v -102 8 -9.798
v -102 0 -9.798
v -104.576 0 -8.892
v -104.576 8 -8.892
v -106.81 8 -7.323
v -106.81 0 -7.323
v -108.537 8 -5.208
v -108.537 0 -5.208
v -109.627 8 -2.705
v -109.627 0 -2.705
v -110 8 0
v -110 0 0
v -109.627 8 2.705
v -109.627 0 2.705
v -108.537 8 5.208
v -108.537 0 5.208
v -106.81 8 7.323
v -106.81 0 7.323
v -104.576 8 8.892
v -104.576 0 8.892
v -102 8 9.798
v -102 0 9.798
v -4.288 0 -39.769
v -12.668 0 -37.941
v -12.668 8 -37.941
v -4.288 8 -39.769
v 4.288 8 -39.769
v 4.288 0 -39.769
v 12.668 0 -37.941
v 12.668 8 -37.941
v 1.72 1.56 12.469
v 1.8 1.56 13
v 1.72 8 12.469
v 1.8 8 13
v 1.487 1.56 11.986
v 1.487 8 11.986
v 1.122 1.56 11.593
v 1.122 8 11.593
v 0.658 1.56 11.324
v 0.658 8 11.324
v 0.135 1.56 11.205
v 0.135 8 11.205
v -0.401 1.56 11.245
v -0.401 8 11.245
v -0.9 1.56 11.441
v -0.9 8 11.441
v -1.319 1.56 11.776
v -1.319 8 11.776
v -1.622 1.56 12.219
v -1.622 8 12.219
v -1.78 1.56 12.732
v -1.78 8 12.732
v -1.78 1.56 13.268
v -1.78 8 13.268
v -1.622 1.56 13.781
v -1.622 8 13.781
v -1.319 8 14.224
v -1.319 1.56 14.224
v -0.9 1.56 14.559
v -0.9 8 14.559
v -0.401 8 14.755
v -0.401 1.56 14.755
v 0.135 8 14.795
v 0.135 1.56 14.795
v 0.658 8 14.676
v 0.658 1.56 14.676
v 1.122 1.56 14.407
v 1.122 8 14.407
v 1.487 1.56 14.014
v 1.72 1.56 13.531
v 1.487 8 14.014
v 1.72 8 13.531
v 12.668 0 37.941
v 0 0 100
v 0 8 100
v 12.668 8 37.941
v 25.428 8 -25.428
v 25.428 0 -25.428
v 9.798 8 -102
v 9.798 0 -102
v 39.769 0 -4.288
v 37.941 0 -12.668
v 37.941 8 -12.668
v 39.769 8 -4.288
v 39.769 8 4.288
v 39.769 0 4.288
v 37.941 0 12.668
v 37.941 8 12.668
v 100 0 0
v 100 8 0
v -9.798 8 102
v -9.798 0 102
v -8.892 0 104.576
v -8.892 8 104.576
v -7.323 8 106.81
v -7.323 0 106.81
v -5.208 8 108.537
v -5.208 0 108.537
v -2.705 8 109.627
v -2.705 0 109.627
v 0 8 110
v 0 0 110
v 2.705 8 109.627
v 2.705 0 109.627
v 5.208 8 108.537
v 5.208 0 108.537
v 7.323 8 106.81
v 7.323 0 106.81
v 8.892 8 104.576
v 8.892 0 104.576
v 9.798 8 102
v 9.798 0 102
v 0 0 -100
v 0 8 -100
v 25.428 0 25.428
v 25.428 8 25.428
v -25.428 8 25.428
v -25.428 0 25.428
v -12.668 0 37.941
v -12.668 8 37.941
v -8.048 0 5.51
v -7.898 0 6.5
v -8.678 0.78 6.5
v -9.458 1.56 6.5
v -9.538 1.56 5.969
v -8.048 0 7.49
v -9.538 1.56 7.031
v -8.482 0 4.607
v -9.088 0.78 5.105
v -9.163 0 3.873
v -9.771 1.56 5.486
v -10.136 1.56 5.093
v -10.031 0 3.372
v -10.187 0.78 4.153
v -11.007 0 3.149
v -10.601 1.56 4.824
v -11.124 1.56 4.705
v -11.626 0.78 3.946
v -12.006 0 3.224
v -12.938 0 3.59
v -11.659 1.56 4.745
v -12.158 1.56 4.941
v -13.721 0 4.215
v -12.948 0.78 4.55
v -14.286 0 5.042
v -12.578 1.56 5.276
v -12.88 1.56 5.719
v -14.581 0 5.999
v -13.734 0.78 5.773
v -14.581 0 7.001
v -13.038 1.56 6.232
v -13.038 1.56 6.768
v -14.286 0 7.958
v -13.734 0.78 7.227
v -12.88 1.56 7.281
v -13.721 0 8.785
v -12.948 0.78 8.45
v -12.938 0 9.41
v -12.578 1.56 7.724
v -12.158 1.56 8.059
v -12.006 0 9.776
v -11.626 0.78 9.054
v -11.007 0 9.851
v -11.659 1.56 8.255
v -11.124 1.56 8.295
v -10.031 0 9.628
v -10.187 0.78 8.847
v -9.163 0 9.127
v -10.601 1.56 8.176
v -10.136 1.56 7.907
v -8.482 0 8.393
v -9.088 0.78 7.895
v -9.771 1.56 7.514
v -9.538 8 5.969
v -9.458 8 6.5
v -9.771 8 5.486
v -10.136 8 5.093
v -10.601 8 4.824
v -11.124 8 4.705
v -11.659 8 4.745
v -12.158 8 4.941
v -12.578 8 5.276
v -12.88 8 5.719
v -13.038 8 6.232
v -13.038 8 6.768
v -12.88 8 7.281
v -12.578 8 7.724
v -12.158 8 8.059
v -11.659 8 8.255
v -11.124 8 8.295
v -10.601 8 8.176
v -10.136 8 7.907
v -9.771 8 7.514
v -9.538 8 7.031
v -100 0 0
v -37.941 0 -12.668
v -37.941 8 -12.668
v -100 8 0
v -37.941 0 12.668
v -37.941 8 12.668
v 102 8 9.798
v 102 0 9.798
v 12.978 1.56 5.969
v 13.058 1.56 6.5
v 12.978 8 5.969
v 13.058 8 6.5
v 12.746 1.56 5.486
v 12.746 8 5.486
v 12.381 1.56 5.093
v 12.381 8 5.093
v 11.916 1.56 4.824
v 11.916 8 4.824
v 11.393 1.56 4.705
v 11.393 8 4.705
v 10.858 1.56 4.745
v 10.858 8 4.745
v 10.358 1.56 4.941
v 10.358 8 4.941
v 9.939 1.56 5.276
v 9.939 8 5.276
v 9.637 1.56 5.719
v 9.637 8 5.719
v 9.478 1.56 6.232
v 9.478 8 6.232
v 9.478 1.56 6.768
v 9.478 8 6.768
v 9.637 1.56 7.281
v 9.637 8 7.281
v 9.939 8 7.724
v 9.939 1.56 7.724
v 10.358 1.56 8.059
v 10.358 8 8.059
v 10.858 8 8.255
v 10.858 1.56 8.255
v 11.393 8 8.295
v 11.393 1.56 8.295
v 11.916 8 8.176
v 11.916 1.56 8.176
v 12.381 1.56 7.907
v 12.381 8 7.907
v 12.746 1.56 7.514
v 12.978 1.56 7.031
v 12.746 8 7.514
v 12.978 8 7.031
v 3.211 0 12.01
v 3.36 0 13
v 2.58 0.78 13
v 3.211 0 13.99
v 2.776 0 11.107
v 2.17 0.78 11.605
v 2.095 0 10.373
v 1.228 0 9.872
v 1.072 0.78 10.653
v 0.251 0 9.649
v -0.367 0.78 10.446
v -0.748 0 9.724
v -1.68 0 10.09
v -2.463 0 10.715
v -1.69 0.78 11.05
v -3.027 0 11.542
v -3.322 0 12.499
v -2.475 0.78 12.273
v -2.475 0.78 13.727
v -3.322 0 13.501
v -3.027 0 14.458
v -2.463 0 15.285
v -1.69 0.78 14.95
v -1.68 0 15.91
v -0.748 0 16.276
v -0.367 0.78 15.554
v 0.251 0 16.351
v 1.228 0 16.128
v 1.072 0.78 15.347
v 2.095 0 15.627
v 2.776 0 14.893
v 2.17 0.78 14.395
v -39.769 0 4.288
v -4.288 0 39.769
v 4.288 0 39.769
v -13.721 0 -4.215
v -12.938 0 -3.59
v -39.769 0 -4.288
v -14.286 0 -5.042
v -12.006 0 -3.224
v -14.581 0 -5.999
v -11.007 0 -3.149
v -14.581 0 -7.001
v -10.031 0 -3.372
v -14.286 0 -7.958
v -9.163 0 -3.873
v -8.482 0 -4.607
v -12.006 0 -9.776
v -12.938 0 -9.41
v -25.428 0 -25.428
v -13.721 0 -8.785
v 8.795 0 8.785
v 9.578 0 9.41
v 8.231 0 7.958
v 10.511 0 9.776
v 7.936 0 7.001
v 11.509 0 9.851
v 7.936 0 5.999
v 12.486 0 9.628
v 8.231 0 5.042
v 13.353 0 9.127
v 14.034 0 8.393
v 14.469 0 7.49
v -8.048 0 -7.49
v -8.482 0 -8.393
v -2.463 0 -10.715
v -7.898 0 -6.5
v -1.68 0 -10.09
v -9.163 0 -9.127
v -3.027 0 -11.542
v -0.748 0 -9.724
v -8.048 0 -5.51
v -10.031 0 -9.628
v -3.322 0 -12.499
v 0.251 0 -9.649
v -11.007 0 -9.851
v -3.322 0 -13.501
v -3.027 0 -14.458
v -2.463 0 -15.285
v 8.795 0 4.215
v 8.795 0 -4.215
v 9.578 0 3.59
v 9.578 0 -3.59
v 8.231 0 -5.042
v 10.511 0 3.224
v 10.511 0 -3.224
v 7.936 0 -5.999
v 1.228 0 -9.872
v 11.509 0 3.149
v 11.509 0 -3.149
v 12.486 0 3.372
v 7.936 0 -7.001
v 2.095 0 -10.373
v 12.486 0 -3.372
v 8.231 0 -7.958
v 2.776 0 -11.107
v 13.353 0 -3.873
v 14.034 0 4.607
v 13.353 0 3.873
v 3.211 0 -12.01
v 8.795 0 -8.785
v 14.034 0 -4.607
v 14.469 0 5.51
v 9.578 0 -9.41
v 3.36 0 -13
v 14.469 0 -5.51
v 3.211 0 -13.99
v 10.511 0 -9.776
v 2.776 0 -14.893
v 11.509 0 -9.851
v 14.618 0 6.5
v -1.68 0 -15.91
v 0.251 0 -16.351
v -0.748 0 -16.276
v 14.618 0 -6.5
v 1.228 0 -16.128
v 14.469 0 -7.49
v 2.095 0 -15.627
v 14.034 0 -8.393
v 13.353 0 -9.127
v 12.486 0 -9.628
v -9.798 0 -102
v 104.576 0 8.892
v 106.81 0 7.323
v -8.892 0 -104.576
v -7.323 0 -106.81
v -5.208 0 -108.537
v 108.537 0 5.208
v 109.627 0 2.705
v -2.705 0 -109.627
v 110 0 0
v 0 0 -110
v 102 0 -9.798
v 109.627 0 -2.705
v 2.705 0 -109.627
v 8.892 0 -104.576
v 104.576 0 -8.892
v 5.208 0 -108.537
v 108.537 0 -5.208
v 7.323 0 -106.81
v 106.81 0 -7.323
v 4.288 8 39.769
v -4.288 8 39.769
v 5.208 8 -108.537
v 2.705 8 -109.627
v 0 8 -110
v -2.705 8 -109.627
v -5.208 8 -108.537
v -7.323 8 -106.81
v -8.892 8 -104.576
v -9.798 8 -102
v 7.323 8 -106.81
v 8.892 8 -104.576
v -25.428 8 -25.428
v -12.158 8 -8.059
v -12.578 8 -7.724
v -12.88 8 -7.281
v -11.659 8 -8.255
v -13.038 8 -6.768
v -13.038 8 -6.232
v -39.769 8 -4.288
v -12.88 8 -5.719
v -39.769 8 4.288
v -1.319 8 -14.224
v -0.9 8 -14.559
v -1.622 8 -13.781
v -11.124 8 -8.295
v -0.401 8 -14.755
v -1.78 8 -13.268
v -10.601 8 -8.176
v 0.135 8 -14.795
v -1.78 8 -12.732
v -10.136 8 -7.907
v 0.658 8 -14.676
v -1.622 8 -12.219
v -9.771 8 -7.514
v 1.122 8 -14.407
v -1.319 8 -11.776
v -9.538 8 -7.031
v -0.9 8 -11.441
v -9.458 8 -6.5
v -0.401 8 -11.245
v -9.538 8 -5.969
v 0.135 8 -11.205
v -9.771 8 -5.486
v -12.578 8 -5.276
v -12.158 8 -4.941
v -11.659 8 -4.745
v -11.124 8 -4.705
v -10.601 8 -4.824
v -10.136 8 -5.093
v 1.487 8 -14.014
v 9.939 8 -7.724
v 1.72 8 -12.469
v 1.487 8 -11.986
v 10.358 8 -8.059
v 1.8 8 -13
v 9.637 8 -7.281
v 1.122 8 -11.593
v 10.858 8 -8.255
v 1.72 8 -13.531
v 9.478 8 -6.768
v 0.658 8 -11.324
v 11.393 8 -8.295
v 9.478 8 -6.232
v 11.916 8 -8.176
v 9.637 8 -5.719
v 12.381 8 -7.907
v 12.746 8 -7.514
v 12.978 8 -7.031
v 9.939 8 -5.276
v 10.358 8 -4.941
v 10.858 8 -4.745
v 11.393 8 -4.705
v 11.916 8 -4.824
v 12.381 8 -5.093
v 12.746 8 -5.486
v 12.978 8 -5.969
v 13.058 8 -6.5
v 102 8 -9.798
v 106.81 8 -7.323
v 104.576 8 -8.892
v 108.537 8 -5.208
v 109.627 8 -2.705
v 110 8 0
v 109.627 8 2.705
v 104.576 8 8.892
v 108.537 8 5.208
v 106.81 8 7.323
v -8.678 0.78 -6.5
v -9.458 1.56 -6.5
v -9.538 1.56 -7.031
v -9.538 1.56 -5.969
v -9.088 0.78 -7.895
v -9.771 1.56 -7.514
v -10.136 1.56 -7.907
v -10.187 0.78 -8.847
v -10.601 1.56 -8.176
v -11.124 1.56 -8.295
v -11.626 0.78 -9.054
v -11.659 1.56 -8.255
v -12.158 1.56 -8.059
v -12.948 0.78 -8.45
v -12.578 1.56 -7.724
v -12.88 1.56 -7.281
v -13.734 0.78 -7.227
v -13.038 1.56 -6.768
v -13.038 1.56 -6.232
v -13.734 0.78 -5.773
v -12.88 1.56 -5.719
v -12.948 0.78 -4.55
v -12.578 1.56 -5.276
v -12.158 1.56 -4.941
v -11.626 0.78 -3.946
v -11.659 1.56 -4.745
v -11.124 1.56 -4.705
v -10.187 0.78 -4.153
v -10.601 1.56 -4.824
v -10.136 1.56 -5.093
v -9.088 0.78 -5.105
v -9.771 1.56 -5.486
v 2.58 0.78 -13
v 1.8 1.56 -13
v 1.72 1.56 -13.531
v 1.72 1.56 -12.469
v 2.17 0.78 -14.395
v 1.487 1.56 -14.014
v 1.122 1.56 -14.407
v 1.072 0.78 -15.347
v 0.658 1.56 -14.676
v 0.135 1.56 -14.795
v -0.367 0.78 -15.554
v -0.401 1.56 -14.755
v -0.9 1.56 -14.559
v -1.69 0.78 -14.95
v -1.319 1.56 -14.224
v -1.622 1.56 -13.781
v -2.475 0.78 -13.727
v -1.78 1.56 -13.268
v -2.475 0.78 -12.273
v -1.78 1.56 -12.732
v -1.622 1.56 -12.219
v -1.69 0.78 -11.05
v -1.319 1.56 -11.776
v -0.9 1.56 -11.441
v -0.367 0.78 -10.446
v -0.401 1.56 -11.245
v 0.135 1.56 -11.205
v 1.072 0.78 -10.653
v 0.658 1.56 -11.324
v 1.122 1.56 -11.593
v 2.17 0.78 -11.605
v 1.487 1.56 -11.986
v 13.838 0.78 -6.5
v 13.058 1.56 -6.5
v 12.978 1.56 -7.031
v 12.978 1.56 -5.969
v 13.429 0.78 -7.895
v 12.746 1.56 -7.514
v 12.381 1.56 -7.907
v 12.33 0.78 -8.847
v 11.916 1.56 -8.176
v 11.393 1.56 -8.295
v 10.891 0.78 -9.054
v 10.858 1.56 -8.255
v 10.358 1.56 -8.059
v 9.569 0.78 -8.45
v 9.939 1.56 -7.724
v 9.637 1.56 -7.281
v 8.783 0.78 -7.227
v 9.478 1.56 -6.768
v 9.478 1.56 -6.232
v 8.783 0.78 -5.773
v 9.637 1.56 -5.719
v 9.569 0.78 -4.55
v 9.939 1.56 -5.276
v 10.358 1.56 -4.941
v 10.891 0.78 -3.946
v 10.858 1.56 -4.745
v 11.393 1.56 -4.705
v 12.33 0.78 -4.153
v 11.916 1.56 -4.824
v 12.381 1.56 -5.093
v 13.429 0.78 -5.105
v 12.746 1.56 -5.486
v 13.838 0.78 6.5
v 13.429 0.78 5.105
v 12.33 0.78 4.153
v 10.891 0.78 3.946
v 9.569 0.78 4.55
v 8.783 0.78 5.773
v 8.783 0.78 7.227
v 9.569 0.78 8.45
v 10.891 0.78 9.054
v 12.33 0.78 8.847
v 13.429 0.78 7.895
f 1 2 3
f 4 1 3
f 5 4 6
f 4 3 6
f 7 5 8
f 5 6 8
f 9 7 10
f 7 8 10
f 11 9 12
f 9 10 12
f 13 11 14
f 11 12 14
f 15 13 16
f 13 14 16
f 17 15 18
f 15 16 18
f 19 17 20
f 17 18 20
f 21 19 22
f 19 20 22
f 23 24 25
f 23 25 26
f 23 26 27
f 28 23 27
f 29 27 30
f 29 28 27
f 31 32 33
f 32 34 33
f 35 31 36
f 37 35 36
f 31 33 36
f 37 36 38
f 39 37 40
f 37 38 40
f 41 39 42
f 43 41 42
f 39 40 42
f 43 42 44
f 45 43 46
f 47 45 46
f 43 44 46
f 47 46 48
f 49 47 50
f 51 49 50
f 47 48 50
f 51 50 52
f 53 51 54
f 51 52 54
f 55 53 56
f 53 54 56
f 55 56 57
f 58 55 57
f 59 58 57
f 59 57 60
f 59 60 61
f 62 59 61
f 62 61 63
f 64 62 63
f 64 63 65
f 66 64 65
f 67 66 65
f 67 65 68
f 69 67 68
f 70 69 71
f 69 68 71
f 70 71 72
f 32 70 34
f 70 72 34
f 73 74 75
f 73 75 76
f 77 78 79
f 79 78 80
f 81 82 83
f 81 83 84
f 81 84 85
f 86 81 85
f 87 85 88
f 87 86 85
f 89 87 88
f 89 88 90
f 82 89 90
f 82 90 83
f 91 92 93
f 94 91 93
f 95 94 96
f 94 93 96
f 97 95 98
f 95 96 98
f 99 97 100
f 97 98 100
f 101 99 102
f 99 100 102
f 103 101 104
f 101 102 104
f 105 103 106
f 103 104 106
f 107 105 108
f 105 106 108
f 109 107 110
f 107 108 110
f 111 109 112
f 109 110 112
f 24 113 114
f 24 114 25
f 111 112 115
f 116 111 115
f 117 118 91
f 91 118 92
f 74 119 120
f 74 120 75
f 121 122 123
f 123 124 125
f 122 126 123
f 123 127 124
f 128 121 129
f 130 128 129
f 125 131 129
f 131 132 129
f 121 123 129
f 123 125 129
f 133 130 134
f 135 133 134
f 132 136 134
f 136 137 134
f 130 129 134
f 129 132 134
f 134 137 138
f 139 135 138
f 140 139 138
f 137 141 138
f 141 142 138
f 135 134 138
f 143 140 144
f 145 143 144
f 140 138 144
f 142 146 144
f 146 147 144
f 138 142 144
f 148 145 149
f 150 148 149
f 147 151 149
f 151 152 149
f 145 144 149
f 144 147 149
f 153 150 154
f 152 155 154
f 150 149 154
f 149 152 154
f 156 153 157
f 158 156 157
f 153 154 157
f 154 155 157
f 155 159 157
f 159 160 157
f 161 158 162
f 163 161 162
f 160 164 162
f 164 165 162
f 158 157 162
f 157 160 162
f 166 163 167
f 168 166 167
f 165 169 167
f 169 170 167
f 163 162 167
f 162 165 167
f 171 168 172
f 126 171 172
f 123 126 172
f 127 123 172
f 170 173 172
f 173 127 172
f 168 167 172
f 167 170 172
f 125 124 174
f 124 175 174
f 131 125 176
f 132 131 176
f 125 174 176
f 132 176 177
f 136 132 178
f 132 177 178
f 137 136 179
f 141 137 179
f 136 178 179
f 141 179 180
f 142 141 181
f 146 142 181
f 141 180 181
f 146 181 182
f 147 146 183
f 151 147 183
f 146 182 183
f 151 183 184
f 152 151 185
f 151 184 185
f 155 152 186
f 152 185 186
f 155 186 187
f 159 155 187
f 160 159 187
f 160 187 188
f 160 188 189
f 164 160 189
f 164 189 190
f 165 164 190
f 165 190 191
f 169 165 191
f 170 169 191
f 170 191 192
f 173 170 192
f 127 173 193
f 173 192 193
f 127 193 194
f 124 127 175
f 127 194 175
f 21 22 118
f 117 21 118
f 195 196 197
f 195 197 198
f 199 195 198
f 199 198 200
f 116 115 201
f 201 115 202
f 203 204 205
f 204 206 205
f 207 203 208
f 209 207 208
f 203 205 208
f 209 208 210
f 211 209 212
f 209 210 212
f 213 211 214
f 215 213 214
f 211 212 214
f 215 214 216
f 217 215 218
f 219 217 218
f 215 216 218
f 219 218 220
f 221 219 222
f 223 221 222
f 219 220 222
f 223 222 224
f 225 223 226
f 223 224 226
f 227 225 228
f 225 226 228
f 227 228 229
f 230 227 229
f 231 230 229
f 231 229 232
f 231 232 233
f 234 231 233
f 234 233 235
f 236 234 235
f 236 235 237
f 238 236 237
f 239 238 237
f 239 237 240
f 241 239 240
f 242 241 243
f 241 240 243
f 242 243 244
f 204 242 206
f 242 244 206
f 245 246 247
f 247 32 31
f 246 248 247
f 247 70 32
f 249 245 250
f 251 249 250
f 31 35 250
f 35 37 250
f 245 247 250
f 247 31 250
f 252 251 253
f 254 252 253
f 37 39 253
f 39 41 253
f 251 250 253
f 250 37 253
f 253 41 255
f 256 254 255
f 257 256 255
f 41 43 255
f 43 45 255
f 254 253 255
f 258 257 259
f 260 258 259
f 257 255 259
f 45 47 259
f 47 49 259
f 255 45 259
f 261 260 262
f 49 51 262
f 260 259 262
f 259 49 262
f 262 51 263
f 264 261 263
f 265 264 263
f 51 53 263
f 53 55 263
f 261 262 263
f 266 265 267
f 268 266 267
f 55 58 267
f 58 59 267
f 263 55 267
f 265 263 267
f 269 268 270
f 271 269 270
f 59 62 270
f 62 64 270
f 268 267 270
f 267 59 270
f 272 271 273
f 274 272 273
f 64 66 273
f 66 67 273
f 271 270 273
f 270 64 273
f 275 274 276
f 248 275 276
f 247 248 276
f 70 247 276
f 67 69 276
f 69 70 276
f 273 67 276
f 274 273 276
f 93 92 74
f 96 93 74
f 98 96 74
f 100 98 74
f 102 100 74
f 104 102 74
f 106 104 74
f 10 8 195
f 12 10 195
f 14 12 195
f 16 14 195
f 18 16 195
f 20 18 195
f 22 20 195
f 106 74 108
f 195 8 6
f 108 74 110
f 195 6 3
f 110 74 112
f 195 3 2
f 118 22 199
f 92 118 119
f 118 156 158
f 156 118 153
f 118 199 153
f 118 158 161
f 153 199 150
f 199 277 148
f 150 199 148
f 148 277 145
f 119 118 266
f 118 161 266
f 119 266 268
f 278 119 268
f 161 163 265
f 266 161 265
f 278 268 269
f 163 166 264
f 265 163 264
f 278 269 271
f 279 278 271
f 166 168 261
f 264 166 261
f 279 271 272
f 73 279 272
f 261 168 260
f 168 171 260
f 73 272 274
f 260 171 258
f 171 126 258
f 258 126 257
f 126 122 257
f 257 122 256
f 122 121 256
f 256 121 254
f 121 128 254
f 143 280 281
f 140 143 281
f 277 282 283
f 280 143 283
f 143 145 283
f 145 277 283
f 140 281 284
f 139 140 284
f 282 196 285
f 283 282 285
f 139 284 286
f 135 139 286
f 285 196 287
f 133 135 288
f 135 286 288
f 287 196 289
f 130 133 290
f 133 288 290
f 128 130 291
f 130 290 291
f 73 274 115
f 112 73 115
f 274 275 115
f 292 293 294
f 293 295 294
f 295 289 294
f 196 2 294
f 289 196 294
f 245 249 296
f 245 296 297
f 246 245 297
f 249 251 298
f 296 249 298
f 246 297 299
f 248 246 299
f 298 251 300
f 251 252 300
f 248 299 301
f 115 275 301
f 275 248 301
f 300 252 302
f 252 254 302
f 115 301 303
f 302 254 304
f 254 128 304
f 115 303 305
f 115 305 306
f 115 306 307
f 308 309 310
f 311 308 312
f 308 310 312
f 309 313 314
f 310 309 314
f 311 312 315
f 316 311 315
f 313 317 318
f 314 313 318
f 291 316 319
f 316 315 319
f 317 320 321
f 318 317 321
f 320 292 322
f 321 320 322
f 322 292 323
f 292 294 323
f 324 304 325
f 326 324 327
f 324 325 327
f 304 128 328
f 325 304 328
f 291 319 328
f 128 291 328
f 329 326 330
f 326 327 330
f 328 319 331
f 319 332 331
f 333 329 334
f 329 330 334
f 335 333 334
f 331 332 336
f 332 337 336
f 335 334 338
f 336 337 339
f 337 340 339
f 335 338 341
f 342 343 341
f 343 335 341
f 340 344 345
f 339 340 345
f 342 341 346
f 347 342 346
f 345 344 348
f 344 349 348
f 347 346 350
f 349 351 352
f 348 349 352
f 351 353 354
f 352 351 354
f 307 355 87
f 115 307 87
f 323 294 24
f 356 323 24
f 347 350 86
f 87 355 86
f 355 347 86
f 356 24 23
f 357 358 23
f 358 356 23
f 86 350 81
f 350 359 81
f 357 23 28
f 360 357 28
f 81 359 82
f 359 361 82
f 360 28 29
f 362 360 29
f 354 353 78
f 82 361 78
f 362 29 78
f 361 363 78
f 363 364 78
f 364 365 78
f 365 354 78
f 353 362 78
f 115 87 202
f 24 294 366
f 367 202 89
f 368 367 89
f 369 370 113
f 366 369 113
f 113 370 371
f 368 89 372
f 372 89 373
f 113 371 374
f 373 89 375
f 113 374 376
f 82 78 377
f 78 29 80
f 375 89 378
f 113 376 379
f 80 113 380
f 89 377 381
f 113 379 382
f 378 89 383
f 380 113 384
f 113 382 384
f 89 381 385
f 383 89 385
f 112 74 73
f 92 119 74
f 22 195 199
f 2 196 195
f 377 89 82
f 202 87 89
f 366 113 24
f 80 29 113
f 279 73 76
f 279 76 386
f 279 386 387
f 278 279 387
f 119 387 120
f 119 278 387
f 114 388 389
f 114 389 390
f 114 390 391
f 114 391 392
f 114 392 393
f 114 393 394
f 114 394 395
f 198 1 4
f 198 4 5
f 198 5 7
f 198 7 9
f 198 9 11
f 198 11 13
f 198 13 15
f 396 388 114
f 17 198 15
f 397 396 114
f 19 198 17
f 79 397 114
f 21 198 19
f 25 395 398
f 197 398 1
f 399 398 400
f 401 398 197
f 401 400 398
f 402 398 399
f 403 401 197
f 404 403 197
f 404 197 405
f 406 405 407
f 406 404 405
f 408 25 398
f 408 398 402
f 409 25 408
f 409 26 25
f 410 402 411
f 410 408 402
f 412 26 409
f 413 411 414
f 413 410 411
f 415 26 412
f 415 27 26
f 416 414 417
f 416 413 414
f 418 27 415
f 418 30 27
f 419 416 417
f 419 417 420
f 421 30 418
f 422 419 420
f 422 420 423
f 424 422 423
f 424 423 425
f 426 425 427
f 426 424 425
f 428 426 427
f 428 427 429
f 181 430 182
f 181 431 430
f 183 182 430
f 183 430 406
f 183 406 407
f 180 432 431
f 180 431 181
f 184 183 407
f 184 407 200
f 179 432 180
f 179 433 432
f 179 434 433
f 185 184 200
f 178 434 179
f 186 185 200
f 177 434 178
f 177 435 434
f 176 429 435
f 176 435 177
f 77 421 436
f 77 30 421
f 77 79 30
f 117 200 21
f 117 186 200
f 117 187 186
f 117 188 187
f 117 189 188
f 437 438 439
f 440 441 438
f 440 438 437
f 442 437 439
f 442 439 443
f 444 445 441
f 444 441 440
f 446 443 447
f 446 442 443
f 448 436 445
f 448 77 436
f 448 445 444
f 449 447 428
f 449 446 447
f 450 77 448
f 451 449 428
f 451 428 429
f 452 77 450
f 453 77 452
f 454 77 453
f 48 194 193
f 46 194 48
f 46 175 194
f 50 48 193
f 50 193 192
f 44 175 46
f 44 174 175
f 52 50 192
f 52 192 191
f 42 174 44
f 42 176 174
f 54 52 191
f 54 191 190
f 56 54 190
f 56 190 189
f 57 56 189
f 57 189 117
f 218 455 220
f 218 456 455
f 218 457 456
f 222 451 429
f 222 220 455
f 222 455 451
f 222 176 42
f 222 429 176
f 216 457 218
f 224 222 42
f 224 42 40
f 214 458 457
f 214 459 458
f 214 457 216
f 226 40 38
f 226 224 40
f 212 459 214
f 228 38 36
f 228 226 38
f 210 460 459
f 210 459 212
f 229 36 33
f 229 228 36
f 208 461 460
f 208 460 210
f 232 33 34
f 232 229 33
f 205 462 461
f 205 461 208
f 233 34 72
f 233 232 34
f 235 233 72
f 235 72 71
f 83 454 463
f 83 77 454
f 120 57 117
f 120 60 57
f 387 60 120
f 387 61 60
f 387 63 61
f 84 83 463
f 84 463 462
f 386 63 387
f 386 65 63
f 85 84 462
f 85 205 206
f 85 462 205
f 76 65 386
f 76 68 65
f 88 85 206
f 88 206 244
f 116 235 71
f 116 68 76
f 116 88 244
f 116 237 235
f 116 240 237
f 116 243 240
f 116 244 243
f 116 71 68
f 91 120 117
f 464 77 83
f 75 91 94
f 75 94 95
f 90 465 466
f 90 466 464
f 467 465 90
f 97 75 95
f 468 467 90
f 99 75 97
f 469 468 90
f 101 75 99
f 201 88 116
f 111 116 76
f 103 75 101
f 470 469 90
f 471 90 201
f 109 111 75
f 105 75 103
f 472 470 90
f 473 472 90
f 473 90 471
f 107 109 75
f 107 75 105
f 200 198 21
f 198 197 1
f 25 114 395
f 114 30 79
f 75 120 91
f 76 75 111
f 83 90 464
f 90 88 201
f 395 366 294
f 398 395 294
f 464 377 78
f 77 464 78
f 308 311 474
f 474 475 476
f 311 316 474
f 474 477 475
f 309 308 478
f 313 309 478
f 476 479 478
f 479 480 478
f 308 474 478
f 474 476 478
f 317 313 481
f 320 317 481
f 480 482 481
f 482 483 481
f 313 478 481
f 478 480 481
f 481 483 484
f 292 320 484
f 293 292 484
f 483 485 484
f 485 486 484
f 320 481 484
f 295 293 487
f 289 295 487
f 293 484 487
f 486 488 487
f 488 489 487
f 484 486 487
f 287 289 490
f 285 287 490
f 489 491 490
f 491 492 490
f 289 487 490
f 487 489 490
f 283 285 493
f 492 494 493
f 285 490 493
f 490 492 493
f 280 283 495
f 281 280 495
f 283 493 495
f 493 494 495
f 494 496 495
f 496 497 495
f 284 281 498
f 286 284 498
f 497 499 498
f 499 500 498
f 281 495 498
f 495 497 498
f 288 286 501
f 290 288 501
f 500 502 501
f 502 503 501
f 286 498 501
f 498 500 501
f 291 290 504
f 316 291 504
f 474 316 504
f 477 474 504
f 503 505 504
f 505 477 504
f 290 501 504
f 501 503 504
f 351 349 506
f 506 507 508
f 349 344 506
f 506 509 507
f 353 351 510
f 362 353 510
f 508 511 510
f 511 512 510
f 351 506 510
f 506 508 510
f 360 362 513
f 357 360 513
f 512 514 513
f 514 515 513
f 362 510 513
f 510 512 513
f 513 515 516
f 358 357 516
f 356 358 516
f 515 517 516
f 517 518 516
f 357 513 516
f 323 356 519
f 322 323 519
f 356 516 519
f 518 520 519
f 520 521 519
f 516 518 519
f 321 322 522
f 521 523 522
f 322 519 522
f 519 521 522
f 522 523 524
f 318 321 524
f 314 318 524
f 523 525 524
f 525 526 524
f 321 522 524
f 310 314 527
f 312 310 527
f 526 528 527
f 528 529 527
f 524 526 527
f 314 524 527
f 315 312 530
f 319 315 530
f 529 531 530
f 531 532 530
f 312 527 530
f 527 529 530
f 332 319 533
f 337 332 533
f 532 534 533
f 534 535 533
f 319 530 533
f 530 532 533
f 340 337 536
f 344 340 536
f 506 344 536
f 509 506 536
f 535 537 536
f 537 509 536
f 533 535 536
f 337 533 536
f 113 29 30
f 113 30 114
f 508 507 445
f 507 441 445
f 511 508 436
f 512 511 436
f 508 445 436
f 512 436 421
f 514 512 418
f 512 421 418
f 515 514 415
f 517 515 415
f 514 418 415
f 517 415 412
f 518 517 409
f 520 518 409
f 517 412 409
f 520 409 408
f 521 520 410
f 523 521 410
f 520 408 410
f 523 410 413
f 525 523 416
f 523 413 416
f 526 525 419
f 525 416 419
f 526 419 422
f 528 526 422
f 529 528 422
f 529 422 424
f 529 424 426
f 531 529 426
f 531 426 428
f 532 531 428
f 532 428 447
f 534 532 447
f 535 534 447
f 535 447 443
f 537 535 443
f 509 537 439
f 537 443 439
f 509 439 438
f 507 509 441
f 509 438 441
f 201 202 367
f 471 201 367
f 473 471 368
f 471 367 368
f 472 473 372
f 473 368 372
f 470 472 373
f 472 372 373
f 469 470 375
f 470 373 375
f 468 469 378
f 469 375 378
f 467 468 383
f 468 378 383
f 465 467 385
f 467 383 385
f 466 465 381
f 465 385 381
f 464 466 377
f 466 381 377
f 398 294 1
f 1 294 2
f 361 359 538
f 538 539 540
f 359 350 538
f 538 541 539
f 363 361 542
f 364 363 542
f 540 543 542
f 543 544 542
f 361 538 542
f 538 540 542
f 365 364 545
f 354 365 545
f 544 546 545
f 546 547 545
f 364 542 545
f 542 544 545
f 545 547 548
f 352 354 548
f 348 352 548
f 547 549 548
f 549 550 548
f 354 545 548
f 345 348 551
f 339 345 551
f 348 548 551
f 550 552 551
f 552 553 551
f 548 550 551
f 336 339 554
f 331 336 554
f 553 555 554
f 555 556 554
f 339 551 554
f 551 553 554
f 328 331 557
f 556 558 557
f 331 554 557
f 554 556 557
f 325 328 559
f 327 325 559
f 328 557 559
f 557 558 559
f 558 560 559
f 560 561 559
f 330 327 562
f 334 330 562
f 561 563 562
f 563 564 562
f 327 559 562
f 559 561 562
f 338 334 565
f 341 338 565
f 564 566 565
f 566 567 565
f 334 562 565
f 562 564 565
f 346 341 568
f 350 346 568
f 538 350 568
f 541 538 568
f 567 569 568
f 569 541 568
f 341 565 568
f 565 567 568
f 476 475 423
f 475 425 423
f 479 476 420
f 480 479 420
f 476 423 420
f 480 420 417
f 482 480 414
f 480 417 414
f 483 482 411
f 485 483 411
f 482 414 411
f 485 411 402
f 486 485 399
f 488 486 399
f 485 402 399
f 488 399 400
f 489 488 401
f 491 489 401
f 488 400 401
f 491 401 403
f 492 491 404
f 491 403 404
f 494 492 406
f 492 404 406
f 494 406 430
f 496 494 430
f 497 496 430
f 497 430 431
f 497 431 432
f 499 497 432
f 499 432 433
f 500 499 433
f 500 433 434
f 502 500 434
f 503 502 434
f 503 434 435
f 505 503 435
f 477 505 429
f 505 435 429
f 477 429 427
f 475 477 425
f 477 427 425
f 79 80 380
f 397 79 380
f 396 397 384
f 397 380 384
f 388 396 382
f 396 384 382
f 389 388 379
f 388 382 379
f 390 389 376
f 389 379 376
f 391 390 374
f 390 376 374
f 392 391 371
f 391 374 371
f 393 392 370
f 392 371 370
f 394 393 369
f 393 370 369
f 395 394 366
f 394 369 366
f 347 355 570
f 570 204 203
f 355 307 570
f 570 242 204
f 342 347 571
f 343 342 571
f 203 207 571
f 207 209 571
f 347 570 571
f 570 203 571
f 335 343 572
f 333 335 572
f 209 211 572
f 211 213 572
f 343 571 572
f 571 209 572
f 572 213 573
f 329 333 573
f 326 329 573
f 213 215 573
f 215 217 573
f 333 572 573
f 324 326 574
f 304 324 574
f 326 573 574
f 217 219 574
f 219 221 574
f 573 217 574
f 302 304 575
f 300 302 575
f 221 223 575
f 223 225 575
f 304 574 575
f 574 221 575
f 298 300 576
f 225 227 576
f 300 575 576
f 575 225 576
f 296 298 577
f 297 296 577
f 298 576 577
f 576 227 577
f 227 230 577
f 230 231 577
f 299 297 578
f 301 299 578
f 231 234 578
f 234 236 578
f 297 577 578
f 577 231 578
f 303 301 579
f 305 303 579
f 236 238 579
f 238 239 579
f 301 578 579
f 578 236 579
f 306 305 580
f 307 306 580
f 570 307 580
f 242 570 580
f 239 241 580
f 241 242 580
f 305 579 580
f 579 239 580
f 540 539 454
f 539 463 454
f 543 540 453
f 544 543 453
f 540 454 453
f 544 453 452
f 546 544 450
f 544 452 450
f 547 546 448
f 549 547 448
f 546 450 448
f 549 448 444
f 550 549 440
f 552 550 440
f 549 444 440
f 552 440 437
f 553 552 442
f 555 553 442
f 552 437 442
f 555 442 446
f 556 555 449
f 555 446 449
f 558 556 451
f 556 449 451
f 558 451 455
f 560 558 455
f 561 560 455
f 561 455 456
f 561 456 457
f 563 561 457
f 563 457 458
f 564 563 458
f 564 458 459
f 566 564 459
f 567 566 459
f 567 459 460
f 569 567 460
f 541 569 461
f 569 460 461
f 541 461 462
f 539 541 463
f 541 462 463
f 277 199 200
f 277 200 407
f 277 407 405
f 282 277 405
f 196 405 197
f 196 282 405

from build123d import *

# Parameters (mm, degrees)
BOSS_EXTRUDE1_DEPTH = 8
CIRPATTERN1_COUNT   = 4


# Read off the part's stored shape, not the designer's step: CSK for M3 Hex Socket Countersunk Cap Screw1
with BuildPart() as part:
    # Sketch2 → Boss-Extrude1 (new body)
    with BuildSketch(Plane(origin=(0, 0, 0), x_dir=(1, 0, 0), z_dir=(0, 1, 0))):
        with BuildLine():
            Line((6, -29.393876913), (102, -9.797958971))
            ThreePointArc((102, -9.797958971), (110, 0), (102, 9.797958971))
            Line((102, 9.797958971), (6, 29.393876913))
            ThreePointArc((6, 29.393876913), (-30, 0), (6, -29.393876913))
        make_face()
        with BuildLine():
            Line((37.941125497, -12.667714712), (100, 0))
            Line((100, 0), (37.941125497, 12.667714712))
            ThreePointArc((37.941125497, 12.667714712), (40, 0), (37.941125497, -12.667714712))
        make_face(mode=Mode.SUBTRACT)
    boss_extrude1 = extrude(amount=BOSS_EXTRUDE1_DEPTH)

    # CirPattern1: Boss-Extrude1 ×4 about axis
    cirpattern1_axis = Axis((0, 0, 0), (0, 1, 0))
    for i in range(1, CIRPATTERN1_COUNT):
        add(boss_extrude1.rotate(cirpattern1_axis, i * 360 / CIRPATTERN1_COUNT))

    # CSK for M3 Hex Socket Countersunk Ca 2 → CSK for M3 Hex Socket Countersunk Cap Screw1 (revolve, cut)
    with BuildSketch(Plane(origin=(-11.258330249, 0, -6.5), x_dir=(1, 0, 0), z_dir=(0, 0, 1))):
        Polygon((1.8, 1.56), (1.8, 8), (0, 8), (0, 0), (3.36, 0), align=None)
    revolve(axis=Axis((-11.258330249, 0, -6.5), (0, 1, 0)), mode=Mode.SUBTRACT)

    # CSK for M3 Hex Socket Countersunk Ca 3 o → CSK for M3 Hex Socket Countersunk Ca 3 (revolve, cut)
    with BuildSketch(Plane(origin=(-11.258330249, 0, 6.5), x_dir=(1, 0, 0), z_dir=(0, 0, 1))):
        Polygon((1.8, 1.56), (1.8, 8), (0, 8), (0, 0), (3.36, 0), align=None)
    revolve(axis=Axis((-11.258330249, 0, 6.5), (0, 1, 0)), mode=Mode.SUBTRACT)

    # CSK for M3 Hex Socket Countersunk Ca 4 o → CSK for M3 Hex Socket Countersunk Ca 4 (revolve, cut)
    with BuildSketch(Plane.XY.offset(13)):
        Polygon((1.8, 1.56), (1.8, 8), (0, 8), (0, 0), (3.36, 0), align=None)
    revolve(axis=Axis((0, 0, 13), (0, 1, 0)), mode=Mode.SUBTRACT)

    # CSK for M3 Hex Socket Countersunk Ca 5 o → CSK for M3 Hex Socket Countersunk Ca 5 (revolve, cut)
    with BuildSketch(Plane(origin=(11.258330249, 0, 6.5), x_dir=(1, 0, 0), z_dir=(0, 0, 1))):
        Polygon((1.8, 1.56), (1.8, 8), (0, 8), (0, 0), (3.36, 0), align=None)
    revolve(axis=Axis((11.258330249, 0, 6.5), (0, 1, 0)), mode=Mode.SUBTRACT)

    # CSK for M3 Hex Socket Countersunk Ca 6 o → CSK for M3 Hex Socket Countersunk Ca 6 (revolve, cut)
    with BuildSketch(Plane(origin=(11.258330249, 0, -6.5), x_dir=(1, 0, 0), z_dir=(0, 0, 1))):
        Polygon((1.8, 1.56), (1.8, 8), (0, 8), (0, 0), (3.36, 0), align=None)
    revolve(axis=Axis((11.258330249, 0, -6.5), (0, 1, 0)), mode=Mode.SUBTRACT)

    # CSK for M3 Hex Socket Countersunk Ca 7 o → CSK for M3 Hex Socket Countersunk Ca 7 (revolve, cut)
    with BuildSketch(Plane.XY.offset(-13)):
        Polygon((1.8, 1.56), (1.8, 8), (0, 8), (0, 0), (3.36, 0), align=None)
    revolve(axis=Axis((0, 0, -13), (0, 1, 0)), mode=Mode.SUBTRACT)


solid = part.part
